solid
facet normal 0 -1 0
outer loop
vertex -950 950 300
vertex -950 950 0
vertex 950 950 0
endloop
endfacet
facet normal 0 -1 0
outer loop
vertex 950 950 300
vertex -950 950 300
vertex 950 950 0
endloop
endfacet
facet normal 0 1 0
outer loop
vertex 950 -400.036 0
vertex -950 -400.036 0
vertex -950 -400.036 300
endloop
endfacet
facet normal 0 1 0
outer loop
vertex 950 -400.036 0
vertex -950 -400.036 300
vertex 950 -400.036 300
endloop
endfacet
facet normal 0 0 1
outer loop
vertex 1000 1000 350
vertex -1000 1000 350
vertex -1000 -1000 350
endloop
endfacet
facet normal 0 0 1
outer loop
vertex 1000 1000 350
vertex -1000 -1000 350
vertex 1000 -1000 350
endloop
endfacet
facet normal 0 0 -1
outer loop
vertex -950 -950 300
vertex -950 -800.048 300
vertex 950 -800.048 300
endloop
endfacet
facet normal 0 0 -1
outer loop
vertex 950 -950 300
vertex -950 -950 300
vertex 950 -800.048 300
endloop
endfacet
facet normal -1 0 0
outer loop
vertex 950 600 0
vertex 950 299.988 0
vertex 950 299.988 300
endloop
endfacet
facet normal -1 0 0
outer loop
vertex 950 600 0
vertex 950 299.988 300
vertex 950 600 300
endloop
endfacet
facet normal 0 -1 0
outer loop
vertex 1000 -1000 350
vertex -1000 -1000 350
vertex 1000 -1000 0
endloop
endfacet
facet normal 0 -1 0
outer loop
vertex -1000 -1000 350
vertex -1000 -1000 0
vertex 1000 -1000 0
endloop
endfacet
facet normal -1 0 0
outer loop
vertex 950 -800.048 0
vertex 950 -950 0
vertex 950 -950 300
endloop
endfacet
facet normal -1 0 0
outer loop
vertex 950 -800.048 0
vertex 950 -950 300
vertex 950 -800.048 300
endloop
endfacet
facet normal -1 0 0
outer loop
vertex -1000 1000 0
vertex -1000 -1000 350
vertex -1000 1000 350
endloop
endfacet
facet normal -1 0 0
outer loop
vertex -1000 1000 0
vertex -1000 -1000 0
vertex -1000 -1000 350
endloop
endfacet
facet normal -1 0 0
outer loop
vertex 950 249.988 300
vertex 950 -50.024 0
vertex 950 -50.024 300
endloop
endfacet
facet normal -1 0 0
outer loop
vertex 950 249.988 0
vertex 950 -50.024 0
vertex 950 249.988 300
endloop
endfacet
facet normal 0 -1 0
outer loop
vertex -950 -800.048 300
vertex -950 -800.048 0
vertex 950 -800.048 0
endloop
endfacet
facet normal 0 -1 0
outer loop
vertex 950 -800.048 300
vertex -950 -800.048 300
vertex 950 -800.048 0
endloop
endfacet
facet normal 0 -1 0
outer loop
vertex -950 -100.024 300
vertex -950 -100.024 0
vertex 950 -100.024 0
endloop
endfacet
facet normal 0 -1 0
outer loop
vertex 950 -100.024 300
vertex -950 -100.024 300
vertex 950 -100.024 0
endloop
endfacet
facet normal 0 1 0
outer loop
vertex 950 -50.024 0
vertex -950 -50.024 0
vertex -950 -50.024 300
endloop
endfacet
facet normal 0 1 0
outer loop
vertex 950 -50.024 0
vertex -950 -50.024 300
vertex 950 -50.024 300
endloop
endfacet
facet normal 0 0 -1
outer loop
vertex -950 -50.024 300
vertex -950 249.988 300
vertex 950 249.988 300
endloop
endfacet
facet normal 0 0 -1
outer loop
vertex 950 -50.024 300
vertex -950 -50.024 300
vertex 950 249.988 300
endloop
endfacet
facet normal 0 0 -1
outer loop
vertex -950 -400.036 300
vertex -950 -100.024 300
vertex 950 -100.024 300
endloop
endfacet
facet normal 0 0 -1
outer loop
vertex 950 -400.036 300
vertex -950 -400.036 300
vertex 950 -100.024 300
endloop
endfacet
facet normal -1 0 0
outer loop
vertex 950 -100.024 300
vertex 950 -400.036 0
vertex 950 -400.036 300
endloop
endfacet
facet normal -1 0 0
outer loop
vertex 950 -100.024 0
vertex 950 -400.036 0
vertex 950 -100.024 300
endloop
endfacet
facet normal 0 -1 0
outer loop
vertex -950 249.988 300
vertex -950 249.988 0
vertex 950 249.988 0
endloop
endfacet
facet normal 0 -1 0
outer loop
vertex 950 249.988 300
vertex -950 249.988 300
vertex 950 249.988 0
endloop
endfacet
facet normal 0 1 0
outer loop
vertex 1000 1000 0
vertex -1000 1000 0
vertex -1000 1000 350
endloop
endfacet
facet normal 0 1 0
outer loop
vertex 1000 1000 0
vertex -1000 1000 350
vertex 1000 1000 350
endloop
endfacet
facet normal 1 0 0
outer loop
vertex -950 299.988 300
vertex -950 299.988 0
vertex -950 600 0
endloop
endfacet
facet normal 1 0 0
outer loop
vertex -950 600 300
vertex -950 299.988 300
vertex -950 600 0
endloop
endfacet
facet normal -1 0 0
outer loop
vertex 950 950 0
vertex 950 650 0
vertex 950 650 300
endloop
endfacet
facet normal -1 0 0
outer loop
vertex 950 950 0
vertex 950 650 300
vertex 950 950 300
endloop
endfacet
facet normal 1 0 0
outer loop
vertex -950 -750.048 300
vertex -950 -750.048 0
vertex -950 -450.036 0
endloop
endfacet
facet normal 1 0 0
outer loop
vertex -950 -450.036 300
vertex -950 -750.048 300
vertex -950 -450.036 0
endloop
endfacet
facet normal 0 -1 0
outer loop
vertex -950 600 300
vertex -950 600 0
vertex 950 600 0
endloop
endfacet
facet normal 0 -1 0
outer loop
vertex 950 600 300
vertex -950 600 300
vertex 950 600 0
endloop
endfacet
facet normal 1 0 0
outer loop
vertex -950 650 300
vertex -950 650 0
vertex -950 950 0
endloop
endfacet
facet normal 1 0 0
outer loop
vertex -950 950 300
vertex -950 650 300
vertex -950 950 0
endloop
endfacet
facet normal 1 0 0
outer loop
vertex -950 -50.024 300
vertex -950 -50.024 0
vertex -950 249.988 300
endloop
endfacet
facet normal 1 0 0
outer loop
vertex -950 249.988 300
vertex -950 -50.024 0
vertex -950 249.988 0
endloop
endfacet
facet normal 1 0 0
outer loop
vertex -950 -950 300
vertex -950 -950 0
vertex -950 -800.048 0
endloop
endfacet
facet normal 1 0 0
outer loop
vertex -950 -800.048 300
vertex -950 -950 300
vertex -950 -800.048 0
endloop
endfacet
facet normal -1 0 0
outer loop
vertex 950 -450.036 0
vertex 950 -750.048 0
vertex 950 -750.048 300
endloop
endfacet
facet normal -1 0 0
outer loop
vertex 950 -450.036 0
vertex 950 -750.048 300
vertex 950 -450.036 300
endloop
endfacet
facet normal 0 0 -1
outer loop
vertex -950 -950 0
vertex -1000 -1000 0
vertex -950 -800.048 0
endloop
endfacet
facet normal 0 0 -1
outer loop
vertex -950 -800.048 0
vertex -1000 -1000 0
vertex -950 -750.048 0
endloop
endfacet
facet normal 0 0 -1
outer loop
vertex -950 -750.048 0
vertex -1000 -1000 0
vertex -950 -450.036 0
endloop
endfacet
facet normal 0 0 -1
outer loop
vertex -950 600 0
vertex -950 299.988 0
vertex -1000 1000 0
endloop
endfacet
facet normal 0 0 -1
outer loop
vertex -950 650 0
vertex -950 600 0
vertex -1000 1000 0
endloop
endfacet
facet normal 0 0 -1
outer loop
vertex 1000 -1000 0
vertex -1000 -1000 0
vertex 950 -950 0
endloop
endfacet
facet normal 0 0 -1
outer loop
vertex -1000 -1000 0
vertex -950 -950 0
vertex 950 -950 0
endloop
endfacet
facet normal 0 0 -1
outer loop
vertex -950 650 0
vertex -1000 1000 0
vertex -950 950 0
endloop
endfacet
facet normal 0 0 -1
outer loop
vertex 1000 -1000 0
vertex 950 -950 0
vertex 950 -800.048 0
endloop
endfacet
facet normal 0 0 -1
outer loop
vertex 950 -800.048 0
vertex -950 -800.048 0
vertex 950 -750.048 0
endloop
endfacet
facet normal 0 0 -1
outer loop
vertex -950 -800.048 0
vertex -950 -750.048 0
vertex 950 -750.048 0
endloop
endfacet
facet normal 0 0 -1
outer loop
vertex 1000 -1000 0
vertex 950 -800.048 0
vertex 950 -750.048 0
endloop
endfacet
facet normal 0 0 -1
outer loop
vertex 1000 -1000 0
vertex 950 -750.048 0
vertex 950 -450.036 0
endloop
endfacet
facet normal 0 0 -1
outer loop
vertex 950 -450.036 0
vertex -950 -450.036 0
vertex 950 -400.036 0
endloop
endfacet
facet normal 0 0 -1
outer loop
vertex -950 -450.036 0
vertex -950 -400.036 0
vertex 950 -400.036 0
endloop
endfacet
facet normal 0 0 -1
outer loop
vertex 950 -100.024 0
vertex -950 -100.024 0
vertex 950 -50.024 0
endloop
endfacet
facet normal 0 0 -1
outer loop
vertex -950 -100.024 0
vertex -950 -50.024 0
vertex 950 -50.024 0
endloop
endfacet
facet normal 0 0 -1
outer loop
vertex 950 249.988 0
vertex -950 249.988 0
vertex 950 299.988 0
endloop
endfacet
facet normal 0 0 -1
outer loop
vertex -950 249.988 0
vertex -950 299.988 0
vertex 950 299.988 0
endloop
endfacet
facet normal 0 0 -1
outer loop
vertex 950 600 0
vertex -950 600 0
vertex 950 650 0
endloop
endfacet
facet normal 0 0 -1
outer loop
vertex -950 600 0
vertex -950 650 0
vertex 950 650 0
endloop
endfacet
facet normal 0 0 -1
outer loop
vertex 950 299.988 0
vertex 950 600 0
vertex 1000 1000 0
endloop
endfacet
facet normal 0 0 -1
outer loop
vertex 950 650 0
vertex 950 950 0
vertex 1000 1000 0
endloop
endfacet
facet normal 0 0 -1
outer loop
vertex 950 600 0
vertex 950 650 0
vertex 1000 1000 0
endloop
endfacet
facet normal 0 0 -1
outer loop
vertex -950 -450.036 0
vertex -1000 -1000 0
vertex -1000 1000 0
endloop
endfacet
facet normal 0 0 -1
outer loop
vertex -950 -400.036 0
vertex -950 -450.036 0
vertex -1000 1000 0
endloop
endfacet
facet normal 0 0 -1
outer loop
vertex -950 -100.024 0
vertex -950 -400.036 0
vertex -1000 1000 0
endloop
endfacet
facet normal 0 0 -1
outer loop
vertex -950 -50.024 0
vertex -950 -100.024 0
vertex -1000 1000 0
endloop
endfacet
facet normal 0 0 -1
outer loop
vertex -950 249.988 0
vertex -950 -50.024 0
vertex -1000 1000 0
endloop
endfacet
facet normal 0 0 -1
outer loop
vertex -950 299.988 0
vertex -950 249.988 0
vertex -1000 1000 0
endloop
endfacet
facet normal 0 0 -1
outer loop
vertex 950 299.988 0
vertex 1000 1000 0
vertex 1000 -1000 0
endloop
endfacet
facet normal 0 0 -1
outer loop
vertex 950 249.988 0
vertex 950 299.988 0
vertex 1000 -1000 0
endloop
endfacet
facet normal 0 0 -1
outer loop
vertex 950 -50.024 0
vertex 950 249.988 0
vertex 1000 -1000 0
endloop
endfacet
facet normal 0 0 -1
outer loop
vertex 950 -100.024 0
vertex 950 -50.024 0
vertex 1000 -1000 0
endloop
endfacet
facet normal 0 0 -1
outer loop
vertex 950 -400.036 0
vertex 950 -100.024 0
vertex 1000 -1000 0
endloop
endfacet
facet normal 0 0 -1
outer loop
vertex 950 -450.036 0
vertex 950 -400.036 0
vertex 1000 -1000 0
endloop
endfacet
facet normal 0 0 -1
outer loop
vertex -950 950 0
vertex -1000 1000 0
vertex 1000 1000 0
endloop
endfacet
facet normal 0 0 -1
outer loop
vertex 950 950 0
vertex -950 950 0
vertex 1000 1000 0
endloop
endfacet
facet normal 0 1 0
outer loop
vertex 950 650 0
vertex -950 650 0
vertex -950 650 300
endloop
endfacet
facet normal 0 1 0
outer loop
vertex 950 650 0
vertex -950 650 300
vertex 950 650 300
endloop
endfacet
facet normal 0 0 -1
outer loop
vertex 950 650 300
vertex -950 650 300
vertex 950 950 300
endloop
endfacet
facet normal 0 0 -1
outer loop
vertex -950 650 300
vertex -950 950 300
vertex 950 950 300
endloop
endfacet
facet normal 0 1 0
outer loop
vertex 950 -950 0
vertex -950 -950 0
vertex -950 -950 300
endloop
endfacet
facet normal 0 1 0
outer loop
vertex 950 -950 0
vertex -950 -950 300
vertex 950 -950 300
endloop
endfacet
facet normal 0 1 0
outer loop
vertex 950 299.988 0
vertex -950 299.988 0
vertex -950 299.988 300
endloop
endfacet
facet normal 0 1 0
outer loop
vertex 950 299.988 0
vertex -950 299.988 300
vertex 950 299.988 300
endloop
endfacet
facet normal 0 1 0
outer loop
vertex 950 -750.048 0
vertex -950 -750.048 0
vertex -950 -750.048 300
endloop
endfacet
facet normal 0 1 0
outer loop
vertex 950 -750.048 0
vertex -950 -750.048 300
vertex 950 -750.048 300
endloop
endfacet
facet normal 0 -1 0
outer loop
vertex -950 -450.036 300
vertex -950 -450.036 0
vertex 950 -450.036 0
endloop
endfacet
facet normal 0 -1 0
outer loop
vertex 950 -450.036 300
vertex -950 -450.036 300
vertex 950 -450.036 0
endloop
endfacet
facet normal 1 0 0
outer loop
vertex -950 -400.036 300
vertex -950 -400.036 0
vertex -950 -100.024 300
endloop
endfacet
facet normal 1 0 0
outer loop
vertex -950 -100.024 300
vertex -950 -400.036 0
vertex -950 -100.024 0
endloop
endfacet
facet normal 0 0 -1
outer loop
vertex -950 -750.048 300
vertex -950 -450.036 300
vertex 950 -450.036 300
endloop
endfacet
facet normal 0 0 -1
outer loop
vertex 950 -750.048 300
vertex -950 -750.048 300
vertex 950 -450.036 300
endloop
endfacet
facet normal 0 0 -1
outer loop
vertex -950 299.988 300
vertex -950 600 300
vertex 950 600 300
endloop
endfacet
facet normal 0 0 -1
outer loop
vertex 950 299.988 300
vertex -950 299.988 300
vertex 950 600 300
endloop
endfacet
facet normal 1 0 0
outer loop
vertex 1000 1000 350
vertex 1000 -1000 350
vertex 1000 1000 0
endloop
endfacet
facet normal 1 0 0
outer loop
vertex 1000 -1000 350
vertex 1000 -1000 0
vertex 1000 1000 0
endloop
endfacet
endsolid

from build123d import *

# Parameters (mm, degrees)
SKETCH1_W           = 2000
SKETCH1_H           = 2000
SKETCH1_W_2         = 1900
SKETCH1_H_2         = 1900
SKETCH1_H_3         = 50
BOSS_EXTRUDE1_DEPTH = 300
SKETCH2_W           = 2000
SKETCH2_H           = 2000
BOSS_EXTRUDE2_DEPTH = 50


with BuildPart() as part:
    # Sketch1 → Boss-Extrude1 (new body)
    with BuildSketch(Plane.XY):
        Rectangle(SKETCH1_W, SKETCH1_H)
        Rectangle(SKETCH1_W_2, SKETCH1_H_2, mode=Mode.SUBTRACT)
        with Locations((0, 625)):
            Rectangle(SKETCH1_W_2, SKETCH1_H_3)
        with Locations((0, 274.988)):
            Rectangle(SKETCH1_W_2, SKETCH1_H_3)
        with Locations((0, -75.024)):
            Rectangle(SKETCH1_W_2, SKETCH1_H_3)
        with Locations((0, -425.036)):
            Rectangle(SKETCH1_W_2, SKETCH1_H_3)
        with Locations((0, -775.048)):
            Rectangle(SKETCH1_W_2, SKETCH1_H_3)
    extrude(amount=BOSS_EXTRUDE1_DEPTH)

    # Sketch2 → Boss-Extrude2 (add)
    with BuildSketch(Plane.XY.offset(300)):
        Rectangle(SKETCH2_W, SKETCH2_H)
    extrude(amount=BOSS_EXTRUDE2_DEPTH)


solid = part.part
